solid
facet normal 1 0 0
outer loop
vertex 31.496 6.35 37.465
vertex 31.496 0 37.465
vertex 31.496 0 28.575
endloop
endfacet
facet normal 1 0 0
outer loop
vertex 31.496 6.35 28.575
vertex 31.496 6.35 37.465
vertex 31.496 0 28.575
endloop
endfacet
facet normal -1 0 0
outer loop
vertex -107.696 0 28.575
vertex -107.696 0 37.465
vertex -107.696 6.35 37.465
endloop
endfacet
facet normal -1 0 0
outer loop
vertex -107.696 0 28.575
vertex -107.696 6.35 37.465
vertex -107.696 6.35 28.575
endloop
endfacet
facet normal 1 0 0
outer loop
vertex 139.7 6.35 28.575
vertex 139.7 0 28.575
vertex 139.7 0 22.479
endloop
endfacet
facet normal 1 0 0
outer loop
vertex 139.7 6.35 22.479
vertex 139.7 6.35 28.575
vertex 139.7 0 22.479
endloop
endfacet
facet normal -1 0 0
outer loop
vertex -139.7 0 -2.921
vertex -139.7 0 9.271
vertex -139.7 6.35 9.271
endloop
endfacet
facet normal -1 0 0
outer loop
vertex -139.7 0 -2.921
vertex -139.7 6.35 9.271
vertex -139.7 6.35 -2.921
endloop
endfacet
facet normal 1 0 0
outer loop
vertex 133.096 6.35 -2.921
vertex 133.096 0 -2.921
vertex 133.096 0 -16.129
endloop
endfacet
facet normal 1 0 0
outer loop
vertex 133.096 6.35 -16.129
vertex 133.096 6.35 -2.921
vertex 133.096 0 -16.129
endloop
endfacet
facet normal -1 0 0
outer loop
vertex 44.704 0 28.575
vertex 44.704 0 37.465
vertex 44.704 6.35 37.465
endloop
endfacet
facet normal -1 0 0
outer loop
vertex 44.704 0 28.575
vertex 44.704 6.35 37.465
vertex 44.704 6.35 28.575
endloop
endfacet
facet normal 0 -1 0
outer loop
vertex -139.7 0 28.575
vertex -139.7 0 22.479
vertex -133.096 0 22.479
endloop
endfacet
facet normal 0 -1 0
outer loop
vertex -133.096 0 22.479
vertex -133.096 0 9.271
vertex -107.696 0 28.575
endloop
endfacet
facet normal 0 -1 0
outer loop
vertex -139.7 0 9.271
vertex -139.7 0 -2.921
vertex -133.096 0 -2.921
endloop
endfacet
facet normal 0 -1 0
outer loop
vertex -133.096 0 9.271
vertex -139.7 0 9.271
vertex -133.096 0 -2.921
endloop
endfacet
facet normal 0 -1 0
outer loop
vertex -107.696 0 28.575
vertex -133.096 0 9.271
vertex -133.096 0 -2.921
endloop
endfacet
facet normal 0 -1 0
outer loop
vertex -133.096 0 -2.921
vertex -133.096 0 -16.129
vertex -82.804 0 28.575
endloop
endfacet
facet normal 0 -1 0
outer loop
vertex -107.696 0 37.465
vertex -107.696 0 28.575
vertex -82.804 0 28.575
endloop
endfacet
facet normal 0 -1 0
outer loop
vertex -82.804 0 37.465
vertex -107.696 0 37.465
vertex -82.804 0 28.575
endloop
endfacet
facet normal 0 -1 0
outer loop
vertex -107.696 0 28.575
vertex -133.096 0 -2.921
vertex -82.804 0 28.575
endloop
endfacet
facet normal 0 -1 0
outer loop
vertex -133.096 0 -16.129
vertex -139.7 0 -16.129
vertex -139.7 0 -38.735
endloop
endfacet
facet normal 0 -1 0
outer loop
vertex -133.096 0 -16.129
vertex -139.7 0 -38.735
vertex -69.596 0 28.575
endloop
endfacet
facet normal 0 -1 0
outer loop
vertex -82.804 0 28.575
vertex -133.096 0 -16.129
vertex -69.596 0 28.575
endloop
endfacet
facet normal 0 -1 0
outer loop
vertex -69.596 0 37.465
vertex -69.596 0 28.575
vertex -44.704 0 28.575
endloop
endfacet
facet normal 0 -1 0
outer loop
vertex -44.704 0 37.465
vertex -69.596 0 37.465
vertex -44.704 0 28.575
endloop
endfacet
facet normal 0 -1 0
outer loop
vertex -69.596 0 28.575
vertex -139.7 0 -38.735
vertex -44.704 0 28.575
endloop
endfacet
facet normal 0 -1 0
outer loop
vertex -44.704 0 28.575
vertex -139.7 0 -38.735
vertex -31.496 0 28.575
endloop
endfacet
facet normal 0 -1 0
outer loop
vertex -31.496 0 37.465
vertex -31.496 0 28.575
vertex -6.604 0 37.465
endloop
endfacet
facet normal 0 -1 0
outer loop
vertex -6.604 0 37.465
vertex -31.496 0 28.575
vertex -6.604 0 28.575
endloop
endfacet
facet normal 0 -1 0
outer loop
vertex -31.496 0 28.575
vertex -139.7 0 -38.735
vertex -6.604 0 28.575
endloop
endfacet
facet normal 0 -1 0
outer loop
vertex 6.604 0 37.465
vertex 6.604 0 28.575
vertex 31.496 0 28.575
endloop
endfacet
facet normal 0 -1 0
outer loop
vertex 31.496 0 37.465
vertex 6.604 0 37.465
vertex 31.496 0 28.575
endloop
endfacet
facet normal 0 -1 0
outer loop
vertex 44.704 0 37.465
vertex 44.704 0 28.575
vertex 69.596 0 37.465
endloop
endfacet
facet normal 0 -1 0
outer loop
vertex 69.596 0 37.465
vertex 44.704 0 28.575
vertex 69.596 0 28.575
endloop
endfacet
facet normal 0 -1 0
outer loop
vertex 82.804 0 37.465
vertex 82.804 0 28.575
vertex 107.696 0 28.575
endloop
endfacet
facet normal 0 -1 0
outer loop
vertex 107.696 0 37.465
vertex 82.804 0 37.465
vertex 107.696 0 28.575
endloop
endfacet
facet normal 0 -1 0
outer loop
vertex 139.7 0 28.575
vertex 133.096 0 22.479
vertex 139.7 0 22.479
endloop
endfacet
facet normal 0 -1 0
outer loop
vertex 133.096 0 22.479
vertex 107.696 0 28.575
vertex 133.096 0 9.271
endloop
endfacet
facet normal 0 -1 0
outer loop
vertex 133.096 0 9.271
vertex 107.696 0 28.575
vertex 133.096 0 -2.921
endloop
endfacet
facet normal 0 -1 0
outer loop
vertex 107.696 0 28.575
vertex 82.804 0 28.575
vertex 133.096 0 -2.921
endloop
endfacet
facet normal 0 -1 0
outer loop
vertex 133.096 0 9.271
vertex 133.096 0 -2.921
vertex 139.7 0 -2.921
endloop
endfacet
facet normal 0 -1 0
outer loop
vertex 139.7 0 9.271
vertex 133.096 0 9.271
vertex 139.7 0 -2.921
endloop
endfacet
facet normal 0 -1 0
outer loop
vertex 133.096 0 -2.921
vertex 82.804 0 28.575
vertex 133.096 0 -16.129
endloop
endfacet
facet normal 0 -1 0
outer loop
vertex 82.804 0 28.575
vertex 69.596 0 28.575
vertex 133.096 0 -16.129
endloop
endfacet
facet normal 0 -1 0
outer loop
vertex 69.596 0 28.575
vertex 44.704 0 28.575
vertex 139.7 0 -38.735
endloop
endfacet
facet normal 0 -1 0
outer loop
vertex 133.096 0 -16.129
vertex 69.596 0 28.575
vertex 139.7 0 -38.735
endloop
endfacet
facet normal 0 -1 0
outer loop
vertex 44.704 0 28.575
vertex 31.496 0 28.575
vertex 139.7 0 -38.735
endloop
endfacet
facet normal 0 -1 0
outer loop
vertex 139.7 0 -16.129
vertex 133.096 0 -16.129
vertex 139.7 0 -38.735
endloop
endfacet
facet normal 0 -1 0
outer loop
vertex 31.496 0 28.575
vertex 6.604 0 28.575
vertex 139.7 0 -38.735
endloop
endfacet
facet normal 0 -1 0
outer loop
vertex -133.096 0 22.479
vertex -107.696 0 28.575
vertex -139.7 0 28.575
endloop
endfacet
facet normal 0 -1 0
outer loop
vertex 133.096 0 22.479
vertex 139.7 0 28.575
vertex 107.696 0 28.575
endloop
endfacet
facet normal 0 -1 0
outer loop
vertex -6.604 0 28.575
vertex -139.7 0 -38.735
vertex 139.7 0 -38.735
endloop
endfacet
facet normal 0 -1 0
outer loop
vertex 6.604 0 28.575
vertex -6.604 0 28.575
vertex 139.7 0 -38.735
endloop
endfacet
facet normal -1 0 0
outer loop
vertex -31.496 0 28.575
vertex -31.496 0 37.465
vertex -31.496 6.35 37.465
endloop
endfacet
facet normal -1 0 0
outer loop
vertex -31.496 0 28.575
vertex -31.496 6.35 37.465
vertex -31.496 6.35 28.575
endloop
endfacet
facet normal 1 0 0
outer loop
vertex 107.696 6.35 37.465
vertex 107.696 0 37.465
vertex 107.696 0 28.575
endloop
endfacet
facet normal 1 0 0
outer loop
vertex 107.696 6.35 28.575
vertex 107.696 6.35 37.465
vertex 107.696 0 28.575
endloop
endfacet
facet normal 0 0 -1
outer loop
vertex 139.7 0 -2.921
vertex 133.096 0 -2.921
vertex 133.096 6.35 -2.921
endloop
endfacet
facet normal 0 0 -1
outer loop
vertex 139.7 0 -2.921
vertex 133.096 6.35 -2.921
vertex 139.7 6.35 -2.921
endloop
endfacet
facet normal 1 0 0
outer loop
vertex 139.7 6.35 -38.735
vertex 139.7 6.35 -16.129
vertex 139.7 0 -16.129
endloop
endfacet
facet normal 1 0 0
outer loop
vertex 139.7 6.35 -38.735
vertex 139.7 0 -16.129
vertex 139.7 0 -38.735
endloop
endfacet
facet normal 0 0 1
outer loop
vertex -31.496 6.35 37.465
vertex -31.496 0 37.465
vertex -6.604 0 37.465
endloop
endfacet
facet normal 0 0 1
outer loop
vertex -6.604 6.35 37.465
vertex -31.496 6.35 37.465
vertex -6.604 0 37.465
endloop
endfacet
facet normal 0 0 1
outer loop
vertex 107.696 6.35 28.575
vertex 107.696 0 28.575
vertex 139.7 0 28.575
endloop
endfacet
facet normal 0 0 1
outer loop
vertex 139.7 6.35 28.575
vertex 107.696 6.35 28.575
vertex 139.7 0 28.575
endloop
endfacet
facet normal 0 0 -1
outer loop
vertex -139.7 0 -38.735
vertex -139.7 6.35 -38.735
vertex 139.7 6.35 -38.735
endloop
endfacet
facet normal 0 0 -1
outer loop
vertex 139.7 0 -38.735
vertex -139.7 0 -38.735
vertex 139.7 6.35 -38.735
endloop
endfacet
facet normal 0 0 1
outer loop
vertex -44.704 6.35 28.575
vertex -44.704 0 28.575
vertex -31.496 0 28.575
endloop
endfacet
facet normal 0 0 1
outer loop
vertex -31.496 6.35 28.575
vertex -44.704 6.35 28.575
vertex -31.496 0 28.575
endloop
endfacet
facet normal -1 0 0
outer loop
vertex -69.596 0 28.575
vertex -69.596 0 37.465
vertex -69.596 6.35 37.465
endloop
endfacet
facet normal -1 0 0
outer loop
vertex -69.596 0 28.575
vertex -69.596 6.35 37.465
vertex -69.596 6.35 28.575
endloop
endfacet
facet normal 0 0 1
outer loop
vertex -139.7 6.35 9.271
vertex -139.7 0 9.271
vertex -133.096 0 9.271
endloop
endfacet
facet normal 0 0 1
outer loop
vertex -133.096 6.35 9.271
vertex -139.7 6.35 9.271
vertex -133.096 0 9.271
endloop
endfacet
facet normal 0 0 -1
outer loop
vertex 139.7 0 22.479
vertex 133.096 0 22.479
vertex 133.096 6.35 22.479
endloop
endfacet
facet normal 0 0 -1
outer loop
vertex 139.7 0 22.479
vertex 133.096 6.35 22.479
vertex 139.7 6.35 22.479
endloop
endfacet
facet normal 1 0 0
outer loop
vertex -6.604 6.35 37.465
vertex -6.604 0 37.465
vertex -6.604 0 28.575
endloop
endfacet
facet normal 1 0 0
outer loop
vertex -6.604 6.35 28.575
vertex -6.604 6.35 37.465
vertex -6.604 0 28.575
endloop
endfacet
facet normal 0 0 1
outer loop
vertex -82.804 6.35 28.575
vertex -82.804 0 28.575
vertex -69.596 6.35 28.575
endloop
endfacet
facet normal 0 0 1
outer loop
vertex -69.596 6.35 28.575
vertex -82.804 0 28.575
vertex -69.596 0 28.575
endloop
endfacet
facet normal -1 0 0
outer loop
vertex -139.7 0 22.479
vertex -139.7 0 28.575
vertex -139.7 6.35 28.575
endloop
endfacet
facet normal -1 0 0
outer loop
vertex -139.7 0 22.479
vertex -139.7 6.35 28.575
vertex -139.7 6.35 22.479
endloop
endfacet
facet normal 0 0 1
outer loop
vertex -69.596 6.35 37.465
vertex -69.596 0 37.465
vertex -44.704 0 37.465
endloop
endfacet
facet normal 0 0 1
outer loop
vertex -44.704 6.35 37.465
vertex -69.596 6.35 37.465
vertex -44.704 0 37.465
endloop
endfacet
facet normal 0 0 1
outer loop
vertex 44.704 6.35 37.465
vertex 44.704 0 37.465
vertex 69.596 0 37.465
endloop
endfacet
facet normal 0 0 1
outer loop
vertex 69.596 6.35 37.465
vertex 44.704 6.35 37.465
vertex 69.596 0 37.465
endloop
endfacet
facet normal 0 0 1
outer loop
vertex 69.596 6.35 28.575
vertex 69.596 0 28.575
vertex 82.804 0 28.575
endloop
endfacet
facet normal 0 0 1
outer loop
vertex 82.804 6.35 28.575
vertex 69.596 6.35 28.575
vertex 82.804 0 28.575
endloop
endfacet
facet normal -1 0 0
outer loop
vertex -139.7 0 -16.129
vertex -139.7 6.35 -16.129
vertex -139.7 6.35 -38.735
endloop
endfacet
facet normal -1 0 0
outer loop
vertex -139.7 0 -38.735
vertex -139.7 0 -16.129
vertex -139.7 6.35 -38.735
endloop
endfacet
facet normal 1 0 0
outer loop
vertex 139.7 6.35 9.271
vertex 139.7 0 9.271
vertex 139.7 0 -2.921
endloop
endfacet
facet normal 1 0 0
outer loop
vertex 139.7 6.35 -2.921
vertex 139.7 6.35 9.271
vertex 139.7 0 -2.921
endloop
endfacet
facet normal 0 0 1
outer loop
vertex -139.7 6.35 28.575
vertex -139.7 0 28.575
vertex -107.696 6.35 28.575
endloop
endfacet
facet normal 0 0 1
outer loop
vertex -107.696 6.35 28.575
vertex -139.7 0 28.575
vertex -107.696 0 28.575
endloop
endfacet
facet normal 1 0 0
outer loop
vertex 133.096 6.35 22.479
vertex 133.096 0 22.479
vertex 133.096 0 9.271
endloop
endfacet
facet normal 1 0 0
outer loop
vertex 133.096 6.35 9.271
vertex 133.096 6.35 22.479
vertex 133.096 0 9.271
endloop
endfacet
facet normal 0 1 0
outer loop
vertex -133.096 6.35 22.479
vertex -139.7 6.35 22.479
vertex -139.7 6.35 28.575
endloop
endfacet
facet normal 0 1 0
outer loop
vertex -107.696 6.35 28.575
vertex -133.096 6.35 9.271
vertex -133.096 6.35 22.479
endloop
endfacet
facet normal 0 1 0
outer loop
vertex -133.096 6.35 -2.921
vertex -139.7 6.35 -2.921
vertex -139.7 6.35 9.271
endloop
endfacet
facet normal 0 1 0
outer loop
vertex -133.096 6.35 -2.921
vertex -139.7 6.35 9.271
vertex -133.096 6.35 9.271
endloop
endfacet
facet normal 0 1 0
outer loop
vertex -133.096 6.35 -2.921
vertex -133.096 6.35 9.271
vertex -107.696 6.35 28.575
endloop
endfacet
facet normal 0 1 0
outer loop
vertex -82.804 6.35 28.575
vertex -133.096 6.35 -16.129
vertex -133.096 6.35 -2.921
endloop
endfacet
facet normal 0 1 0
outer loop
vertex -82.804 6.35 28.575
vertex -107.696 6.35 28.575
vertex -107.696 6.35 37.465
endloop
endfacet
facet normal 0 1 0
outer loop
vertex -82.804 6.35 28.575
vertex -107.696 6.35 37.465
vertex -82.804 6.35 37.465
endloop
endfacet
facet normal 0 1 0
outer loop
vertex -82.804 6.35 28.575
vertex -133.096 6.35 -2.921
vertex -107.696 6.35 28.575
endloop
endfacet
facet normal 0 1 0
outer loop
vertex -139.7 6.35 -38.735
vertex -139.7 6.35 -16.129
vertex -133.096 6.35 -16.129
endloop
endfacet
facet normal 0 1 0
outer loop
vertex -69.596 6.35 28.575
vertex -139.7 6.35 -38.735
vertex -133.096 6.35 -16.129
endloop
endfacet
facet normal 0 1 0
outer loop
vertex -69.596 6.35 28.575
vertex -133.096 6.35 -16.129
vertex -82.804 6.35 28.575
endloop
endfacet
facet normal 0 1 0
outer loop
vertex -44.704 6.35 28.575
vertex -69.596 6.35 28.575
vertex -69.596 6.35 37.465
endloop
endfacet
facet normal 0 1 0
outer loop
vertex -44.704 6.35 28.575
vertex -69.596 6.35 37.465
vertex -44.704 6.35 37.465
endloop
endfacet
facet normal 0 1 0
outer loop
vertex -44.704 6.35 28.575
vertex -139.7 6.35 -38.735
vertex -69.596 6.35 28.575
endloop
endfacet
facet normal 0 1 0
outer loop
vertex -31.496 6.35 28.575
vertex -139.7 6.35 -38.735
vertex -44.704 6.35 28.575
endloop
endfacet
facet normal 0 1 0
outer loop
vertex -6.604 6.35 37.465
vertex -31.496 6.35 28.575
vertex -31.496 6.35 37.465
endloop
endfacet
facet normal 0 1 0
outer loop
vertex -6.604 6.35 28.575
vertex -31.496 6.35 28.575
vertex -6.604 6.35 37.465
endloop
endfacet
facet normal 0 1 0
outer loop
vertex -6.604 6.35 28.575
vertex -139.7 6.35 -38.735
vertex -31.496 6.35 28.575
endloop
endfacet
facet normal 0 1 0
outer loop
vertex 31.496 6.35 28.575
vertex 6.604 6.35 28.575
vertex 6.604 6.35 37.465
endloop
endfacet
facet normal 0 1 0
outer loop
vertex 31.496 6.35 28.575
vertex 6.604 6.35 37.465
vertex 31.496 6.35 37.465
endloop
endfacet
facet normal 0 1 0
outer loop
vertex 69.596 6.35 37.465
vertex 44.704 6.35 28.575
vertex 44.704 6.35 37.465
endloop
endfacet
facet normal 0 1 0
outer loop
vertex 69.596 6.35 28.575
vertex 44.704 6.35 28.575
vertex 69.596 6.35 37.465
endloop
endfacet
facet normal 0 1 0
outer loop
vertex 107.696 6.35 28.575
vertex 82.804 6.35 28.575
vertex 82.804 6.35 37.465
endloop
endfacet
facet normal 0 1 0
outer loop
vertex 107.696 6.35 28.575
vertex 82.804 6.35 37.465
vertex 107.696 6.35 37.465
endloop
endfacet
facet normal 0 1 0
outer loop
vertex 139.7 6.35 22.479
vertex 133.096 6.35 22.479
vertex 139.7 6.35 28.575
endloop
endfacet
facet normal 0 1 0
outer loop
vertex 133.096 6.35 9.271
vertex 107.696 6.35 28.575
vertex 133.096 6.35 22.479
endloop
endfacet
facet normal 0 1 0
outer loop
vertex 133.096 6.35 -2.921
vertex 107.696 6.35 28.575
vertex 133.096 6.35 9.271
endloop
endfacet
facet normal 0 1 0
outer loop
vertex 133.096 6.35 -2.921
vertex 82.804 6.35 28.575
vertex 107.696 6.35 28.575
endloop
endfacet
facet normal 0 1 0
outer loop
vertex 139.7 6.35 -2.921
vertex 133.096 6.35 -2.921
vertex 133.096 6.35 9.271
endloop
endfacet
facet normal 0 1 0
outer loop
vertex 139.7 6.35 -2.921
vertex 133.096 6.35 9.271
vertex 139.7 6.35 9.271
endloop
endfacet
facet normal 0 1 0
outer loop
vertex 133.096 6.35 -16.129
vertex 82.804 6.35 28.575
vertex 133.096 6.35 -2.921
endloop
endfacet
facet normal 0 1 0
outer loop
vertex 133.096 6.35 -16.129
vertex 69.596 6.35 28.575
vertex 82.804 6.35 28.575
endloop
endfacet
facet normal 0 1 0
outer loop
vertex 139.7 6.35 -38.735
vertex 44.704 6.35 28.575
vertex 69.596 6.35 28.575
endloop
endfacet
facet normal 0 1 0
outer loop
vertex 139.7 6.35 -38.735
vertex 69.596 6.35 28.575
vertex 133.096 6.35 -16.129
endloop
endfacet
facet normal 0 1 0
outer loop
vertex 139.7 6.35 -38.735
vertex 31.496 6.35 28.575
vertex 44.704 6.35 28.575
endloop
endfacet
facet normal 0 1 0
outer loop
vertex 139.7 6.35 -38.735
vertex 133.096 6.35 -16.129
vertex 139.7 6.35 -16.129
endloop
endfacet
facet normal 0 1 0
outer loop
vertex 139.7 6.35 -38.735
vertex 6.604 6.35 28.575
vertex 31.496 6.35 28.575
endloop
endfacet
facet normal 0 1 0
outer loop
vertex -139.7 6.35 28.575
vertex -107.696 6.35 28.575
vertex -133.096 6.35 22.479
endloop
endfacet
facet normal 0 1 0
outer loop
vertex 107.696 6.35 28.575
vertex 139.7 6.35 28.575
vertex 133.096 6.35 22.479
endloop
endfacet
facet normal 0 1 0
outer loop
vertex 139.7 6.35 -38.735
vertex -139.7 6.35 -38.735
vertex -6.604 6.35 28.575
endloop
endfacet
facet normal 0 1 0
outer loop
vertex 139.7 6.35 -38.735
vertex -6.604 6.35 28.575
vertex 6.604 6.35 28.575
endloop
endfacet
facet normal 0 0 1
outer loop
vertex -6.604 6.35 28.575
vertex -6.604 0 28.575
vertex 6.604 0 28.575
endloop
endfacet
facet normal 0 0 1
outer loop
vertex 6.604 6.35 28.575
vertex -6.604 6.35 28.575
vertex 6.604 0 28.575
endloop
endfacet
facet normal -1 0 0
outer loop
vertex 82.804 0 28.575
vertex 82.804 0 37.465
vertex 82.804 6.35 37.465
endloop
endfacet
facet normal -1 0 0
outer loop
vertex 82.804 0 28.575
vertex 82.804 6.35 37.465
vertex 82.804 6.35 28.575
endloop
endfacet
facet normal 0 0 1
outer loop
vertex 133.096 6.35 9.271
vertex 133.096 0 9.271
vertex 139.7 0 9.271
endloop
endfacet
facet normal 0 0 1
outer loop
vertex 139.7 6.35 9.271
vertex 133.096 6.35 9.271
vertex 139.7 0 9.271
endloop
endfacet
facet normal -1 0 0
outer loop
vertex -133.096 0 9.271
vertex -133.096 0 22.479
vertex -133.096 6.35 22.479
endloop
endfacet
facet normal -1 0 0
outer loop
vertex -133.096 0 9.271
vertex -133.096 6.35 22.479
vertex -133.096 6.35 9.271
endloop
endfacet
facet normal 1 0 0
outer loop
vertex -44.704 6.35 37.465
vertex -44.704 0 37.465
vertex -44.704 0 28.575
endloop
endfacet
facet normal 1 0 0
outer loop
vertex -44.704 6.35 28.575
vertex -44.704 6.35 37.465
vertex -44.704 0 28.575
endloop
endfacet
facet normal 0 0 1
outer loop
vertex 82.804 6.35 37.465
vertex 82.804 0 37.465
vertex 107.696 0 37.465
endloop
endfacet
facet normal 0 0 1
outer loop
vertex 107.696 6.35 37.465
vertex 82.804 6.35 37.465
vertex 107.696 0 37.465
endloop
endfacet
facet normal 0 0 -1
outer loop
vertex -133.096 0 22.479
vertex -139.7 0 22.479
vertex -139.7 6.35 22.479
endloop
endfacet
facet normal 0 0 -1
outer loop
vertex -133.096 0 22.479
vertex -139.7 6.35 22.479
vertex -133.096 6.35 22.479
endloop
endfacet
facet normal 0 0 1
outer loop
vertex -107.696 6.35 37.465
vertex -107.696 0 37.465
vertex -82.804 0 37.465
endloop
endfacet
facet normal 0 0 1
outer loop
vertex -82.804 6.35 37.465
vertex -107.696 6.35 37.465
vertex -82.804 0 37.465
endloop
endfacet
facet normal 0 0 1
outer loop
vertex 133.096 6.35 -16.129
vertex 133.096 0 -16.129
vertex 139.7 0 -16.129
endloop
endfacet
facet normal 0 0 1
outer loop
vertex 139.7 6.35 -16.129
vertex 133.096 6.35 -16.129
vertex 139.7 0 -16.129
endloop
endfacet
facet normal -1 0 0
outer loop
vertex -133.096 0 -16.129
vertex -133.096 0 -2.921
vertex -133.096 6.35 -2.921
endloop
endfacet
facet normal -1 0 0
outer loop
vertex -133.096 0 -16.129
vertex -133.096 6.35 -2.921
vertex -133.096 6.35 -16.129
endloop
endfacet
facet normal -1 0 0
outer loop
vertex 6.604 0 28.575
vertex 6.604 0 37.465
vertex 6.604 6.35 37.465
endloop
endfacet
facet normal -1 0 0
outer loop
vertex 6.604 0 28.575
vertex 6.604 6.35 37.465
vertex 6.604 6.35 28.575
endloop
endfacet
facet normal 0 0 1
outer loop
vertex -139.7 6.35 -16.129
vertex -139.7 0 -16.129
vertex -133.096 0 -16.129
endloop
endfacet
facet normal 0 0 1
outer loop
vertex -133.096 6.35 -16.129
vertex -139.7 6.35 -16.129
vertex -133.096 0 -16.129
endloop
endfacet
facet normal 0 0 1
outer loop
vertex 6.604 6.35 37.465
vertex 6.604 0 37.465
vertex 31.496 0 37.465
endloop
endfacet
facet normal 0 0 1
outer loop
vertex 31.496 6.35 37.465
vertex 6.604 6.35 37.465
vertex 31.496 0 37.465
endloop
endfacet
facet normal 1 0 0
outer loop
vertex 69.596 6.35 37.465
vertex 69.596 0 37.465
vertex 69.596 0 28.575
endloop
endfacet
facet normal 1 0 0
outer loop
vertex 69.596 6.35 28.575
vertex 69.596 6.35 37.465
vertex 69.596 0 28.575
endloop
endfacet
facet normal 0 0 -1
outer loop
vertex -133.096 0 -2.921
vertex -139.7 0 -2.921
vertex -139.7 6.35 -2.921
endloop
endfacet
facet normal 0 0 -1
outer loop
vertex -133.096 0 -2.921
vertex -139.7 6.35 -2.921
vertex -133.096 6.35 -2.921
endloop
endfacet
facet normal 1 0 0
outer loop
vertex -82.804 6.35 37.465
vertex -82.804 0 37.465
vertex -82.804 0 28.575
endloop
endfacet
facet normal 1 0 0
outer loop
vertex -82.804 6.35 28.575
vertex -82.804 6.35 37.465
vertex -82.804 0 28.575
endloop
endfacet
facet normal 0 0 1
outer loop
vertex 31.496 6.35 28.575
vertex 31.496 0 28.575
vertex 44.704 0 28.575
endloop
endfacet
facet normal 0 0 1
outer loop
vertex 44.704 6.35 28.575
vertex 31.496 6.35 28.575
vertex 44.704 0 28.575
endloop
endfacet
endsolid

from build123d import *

# Parameters (mm, degrees)
SKETCH1_W           = 279.4
SKETCH1_H           = 57.15
BOSS_EXTRUDE1_DEPTH = 6.35
SKETCH3_W           = 24.892
SKETCH3_H           = 8.89
BOSS_EXTRUDE2_DEPTH = 6.35
SKETCH4_W           = 13.208
SKETCH4_H           = 13.208
CUT_EXTRUDE2_DEPTH  = 145.775822308
SKETCH5_W           = 311.517575851
SKETCH5_H           = 2.54
CUT_EXTRUDE3_DEPTH  = 145.775822308
SKETCH6_W           = 279.4
SKETCH6_H           = 12.7
BOSS_EXTRUDE3_DEPTH = 6.35


with BuildPart() as part:
    # Sketch1 → Boss-Extrude1 (new body)
    with BuildSketch(Plane(origin=(0, 0, 0), x_dir=(1, 0, 0), z_dir=(0, 1, 0))):
        Rectangle(SKETCH1_W, SKETCH1_H)
    extrude(amount=BOSS_EXTRUDE1_DEPTH)

    # Sketch3 → Boss-Extrude2 (add)
    with BuildSketch(Plane(origin=(0, 0, 0), x_dir=(1, 0, 0), z_dir=(0, 1, 0))):
        with Locations((-95.25, -33.02)):
            Rectangle(SKETCH3_W, SKETCH3_H)
        with Locations((-57.15, -33.02)):
            Rectangle(SKETCH3_W, SKETCH3_H)
        with Locations((-19.05, -33.02)):
            Rectangle(SKETCH3_W, SKETCH3_H)
        with Locations((19.05, -33.02)):
            Rectangle(SKETCH3_W, SKETCH3_H)
        with Locations((57.15, -33.02)):
            Rectangle(SKETCH3_W, SKETCH3_H)
        with Locations((95.25, -33.02)):
            Rectangle(SKETCH3_W, SKETCH3_H)
    extrude(amount=BOSS_EXTRUDE2_DEPTH)

    # Sketch4 → Cut-Extrude2 (cut, through all)
    with BuildSketch(Plane(origin=(0, 0, 0), x_dir=(1, 0, 0), z_dir=(0, 1, 0))):
        with Locations((-139.7, 9.525)):
            Rectangle(SKETCH4_W, SKETCH4_H)
        with Locations((-139.7, -15.875)):
            Rectangle(SKETCH4_W, SKETCH4_H)
        with Locations((139.7, -15.875)):
            Rectangle(SKETCH4_W, SKETCH4_H)
        with Locations((139.7, 9.525)):
            Rectangle(SKETCH4_W, SKETCH4_H)
    extrude(amount=CUT_EXTRUDE2_DEPTH, mode=Mode.SUBTRACT)

    # Sketch5 → Cut-Extrude3 (cut, through all)
    with BuildSketch(Plane(origin=(0, 6.35, 0), x_dir=(1, 0, 0), z_dir=(0, 1, 0))):
        with Locations((16.058787925, 27.305)):
            Rectangle(SKETCH5_W, SKETCH5_H)
    extrude(amount=-CUT_EXTRUDE3_DEPTH, mode=Mode.SUBTRACT)

    # Sketch6 → Boss-Extrude3 (add)
    with BuildSketch(Plane(origin=(0, 6.35, 0), x_dir=(1, 0, 0), z_dir=(0, 1, 0))):
        with Locations((0, 32.385)):
            Rectangle(SKETCH6_W, SKETCH6_H)
    extrude(amount=-BOSS_EXTRUDE3_DEPTH)


solid = part.part
